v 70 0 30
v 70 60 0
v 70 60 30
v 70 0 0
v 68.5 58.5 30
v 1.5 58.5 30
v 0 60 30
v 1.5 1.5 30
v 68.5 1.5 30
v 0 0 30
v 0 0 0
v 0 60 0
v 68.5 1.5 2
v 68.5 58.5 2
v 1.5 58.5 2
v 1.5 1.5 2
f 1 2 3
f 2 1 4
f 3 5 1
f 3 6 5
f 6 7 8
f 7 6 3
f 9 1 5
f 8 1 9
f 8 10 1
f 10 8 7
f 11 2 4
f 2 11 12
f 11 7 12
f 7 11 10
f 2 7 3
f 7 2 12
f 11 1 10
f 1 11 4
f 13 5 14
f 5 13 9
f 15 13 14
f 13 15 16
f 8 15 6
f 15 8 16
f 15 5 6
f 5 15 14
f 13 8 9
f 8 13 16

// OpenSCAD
$fn = 32;

// ----------------------------------------------------------------------
// Open box: 1.5 mm walls
// ----------------------------------------------------------------------

// --- parameters (mm) ---
box_l = 70;               // outer length, X
box_w = 60;               // outer width, Y
box_h = 30;               // outer height, Z
wall = 1.5;               // wall thickness
floor = 2;                // floor thickness

difference() {
  cube([box_l, box_w, box_h]);
  translate([wall, wall, floor])
    cube([box_l - 2 * wall, box_w - 2 * wall, box_h]);
}
